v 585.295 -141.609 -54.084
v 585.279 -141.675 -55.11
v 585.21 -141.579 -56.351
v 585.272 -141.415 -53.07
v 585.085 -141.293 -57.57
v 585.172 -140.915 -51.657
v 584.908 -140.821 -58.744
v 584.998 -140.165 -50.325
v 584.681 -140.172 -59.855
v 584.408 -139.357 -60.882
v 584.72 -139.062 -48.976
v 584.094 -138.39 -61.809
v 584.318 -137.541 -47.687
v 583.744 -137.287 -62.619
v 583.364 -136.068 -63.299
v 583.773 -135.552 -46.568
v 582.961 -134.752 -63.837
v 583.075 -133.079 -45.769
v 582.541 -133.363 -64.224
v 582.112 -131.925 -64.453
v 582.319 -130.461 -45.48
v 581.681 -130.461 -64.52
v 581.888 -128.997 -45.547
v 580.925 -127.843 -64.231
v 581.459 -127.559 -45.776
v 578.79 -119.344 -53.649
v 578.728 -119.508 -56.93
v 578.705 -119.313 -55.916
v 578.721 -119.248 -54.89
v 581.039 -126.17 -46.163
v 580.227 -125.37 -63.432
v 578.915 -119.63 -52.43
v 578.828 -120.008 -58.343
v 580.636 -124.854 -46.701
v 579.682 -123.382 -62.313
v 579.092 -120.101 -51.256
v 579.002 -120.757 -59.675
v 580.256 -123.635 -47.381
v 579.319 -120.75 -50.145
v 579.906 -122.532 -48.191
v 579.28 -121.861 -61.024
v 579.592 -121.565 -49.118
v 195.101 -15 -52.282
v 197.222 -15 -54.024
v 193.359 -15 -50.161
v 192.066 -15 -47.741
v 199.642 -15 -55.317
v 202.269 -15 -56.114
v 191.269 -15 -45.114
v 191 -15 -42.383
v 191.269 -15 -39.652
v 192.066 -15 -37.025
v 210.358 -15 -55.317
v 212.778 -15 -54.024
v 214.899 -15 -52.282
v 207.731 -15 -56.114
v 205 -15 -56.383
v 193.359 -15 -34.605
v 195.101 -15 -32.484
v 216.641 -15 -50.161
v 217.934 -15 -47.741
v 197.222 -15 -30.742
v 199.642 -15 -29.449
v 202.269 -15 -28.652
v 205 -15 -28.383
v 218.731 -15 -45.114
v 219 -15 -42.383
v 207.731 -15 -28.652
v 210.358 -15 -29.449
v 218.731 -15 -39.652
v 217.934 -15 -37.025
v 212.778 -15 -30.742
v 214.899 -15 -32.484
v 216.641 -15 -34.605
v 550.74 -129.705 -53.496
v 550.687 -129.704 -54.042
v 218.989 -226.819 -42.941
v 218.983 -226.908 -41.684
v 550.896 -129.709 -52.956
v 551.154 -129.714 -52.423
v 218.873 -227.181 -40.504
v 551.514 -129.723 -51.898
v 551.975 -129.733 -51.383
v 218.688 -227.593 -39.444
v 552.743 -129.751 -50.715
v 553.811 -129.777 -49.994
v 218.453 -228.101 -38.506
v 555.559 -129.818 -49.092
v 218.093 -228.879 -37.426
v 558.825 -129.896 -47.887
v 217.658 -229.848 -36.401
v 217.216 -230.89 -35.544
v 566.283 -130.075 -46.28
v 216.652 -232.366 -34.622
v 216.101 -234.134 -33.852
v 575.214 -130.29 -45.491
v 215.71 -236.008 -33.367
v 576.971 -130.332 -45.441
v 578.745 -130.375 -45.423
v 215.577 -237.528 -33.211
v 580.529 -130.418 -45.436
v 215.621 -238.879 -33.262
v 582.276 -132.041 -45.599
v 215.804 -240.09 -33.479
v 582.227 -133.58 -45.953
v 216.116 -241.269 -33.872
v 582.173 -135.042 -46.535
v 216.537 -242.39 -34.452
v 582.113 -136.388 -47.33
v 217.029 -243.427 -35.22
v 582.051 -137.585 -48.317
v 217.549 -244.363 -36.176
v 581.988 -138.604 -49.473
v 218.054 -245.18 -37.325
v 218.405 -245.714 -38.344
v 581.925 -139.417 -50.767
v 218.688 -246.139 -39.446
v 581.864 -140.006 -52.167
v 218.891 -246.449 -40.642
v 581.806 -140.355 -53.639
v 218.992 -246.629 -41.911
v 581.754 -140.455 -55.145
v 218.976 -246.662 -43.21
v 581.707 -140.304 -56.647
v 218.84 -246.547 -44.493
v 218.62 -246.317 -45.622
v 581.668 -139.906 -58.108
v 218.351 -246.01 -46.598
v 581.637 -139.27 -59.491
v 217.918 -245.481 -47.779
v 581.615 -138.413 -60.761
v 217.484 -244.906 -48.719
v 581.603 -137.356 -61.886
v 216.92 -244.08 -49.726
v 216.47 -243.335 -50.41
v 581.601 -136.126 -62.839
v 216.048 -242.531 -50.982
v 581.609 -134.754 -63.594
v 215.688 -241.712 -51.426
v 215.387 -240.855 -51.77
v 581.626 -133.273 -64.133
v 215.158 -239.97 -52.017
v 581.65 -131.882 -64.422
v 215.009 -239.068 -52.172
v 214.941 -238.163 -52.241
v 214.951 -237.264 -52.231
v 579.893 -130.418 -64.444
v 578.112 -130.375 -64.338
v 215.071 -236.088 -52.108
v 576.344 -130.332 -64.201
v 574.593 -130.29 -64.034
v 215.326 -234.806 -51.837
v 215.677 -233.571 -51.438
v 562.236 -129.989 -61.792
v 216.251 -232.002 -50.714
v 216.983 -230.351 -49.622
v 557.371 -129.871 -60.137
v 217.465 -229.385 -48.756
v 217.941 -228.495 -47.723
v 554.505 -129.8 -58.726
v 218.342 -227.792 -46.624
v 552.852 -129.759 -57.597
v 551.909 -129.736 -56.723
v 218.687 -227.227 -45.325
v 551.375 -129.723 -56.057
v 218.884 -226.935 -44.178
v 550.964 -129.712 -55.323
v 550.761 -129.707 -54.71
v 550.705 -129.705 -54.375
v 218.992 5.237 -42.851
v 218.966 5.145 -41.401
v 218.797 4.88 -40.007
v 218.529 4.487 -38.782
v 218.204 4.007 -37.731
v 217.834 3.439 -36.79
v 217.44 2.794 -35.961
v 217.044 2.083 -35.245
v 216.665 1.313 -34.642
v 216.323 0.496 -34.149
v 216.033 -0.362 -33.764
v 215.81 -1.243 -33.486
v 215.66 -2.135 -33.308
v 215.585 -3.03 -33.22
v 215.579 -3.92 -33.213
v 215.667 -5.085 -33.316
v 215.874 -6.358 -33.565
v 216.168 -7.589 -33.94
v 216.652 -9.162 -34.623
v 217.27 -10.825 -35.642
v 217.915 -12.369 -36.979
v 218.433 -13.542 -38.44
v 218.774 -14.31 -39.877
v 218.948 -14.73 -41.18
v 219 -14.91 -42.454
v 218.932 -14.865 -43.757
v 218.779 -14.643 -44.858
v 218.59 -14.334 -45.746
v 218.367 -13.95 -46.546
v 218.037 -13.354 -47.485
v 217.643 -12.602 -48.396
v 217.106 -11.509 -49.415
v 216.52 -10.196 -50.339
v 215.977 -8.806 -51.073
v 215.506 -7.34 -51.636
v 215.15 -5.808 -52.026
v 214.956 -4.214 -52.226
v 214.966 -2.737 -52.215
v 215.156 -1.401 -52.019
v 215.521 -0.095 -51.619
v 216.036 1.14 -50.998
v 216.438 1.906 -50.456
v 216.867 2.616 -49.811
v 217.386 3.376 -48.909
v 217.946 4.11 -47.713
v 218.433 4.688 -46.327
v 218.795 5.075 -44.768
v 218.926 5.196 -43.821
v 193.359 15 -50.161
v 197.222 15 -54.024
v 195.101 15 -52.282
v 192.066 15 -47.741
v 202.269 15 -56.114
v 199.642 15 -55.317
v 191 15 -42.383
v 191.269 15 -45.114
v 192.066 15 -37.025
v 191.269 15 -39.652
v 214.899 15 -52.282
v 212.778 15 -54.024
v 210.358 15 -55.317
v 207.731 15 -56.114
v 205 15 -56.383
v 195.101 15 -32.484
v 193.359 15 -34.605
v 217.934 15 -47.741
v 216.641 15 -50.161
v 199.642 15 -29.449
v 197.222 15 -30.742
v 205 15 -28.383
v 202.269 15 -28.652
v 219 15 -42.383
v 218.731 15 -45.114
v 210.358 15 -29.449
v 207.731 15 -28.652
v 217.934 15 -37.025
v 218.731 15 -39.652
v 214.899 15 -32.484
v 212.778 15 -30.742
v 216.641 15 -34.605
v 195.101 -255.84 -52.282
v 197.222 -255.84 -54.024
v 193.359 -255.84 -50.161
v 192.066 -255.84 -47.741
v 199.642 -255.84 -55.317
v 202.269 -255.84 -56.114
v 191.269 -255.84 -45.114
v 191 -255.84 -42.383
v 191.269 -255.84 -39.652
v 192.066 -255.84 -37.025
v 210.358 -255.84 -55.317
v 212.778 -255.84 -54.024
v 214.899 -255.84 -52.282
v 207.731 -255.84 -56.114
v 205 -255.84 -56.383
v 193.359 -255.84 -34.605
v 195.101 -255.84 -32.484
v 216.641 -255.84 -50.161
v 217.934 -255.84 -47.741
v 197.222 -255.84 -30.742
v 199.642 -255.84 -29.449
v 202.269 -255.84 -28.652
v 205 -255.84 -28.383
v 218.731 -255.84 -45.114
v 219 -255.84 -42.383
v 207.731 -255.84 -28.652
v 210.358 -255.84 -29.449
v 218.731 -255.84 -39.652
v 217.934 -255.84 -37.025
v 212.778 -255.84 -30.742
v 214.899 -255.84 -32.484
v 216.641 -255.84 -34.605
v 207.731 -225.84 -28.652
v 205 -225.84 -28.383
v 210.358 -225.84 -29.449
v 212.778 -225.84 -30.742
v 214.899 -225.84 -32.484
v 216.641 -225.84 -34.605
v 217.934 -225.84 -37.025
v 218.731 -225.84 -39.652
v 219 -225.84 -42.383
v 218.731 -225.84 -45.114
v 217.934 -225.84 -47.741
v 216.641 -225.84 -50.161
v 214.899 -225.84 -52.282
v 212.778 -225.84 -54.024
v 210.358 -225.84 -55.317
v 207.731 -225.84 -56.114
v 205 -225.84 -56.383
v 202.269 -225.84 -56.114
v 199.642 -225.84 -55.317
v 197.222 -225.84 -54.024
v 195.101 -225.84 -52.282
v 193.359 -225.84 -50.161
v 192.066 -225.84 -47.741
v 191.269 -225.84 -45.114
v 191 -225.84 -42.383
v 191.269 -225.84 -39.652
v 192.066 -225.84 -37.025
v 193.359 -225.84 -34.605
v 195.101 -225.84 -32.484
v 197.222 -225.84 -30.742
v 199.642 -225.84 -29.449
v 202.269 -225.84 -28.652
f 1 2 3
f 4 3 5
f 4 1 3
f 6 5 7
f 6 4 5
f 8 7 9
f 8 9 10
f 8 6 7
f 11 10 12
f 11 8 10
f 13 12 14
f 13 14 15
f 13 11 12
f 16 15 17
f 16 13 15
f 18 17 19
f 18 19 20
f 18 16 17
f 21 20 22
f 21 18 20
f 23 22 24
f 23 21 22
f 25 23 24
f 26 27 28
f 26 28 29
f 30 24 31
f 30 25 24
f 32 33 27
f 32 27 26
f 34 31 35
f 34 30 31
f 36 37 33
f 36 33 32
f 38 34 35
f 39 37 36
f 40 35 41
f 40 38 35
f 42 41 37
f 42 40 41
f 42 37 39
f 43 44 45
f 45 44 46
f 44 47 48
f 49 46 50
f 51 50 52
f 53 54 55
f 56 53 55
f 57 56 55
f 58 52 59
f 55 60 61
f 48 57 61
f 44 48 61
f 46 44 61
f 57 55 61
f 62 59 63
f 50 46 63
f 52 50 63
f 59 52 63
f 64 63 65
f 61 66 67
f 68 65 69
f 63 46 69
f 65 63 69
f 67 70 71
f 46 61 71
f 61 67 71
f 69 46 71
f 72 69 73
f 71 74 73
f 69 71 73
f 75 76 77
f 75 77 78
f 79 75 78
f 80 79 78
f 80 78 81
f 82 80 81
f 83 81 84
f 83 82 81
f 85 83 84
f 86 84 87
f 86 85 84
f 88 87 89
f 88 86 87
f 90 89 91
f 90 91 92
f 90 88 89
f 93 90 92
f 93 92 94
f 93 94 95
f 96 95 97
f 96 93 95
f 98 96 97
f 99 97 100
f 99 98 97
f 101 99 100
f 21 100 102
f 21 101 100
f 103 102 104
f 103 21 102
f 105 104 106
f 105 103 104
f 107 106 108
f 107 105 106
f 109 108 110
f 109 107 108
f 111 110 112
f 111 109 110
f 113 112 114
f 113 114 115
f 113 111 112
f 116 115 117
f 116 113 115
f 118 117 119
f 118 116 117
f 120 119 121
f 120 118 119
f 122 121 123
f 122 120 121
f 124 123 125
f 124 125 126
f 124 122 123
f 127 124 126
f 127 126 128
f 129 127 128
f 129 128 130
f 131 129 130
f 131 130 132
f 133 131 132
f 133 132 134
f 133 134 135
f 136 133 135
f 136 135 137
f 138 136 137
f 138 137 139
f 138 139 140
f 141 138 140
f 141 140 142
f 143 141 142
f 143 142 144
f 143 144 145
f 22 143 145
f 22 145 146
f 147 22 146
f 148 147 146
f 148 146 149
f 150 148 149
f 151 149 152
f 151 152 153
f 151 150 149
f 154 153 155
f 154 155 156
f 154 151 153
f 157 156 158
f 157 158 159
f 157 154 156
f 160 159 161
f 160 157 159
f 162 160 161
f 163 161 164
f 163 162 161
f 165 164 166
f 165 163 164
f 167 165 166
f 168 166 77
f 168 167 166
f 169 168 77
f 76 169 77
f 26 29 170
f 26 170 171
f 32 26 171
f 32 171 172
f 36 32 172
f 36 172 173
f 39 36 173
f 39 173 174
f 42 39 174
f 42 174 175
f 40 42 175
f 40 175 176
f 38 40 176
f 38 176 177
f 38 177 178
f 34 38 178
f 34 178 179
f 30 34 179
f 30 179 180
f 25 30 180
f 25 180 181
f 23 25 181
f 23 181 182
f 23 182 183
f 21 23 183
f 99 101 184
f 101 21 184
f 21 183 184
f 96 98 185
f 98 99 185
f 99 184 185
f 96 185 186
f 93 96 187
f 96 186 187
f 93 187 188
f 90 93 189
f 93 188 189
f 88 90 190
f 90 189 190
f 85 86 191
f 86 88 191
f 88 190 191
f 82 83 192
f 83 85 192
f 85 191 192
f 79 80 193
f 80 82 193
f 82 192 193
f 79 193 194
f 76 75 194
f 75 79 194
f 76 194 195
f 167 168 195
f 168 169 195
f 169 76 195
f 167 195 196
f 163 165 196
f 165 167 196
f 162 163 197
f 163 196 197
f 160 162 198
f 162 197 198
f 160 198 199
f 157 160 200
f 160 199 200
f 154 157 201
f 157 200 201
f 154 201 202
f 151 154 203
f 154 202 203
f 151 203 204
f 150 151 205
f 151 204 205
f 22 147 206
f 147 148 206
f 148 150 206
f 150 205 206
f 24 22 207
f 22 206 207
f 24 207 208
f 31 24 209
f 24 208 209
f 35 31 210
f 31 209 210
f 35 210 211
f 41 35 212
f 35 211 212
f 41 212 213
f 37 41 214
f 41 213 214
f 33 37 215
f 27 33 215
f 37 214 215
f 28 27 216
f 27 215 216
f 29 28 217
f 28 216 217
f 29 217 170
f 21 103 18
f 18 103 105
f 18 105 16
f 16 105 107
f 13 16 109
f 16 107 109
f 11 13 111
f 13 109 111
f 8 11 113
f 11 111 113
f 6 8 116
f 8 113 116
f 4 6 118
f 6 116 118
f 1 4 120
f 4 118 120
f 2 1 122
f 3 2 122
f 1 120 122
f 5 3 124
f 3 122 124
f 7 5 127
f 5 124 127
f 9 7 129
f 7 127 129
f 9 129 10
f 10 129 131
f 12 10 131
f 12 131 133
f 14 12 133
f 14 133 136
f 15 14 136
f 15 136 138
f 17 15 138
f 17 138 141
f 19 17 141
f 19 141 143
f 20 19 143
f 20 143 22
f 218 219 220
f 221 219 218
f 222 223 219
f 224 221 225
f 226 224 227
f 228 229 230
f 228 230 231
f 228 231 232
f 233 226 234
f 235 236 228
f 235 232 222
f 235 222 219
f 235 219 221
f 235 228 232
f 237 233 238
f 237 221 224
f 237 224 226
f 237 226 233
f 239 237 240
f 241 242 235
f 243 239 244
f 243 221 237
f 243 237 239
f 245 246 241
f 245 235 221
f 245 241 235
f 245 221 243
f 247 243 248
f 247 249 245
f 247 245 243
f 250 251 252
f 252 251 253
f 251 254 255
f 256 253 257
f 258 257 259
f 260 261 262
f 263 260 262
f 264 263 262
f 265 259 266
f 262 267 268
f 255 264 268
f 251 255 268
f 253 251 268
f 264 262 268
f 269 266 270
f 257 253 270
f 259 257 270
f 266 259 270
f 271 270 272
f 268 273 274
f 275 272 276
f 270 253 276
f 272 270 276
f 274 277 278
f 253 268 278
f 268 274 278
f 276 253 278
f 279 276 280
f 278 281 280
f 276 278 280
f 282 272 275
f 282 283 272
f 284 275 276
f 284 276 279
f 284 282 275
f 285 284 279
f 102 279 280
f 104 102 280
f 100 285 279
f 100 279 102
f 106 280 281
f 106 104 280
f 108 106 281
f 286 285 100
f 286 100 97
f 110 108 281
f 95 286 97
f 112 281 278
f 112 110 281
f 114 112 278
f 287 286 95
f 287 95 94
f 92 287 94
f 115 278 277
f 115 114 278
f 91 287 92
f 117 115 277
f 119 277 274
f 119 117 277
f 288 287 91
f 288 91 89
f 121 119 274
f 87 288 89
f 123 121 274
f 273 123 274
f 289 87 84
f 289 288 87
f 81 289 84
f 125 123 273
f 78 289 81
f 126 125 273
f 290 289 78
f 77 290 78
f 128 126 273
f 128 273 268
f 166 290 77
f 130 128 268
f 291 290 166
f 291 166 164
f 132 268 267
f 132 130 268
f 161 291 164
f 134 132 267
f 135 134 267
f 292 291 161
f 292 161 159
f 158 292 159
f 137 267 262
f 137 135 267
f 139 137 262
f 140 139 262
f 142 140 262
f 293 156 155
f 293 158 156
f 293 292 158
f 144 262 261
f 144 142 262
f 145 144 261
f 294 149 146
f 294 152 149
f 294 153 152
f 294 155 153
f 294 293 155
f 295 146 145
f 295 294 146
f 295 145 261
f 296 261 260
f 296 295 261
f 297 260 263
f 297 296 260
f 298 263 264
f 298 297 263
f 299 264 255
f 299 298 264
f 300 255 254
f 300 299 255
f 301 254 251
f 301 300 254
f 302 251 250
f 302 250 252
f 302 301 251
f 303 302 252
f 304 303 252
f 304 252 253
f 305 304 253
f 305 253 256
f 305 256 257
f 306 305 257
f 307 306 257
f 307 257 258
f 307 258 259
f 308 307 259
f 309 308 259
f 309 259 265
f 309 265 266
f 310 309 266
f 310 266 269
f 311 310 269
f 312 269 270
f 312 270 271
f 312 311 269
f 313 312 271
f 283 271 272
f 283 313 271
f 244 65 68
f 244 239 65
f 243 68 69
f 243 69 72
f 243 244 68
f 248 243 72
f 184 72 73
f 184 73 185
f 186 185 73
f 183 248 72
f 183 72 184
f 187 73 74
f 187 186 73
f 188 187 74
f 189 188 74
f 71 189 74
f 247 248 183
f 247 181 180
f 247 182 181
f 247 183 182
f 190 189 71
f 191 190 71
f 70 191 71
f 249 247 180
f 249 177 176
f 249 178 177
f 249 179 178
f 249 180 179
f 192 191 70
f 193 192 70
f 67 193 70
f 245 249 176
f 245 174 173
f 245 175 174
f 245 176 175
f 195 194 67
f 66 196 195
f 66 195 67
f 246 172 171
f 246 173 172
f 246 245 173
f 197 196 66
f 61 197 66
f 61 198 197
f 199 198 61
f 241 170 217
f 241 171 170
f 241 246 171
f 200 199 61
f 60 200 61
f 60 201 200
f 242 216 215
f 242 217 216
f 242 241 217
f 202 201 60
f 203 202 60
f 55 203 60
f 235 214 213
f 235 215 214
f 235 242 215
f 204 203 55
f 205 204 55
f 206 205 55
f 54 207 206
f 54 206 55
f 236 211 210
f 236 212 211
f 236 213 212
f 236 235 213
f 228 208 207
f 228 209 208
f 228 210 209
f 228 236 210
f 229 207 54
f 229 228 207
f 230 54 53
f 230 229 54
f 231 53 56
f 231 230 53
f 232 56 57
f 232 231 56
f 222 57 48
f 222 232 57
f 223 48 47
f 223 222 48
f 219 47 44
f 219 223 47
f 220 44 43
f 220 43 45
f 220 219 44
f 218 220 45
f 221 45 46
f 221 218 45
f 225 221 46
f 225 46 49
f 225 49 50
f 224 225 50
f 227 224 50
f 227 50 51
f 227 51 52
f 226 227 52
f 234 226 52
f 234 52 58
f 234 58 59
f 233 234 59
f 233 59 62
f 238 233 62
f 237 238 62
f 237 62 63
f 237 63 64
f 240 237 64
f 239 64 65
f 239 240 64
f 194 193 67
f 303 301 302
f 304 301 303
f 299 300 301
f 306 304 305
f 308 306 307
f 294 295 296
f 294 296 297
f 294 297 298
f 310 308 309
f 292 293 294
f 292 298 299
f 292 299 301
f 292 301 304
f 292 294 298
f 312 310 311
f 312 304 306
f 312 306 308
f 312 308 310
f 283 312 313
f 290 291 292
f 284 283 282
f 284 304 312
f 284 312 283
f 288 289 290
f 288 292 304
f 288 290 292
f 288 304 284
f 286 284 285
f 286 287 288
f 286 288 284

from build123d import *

# Parameters (mm, degrees)
SUSP_FR_LCA_FRONT_LEG_PROFILE_R  = 9.525
SUSP_FR_LCA_REAR_LEG_START       = 194.971257269
SUSP_FR_LCA_REAR_LEG_OUTLINE_R   = 9.525
SUSP_FR_LCA_REAR_LEG_DEPTH       = 392.368202981
SUSP_FR_LCA_REAR_LEG_START_2     = 587.33946025
SUSP_FR_LCA_REAR_LEG_2_OUTLINE_R = 9.525
SUSP_FR_LCA_REAR_LEG_2_DEPTH     = 13.53250199
SUSP_FR_LCA_REAR_LEG_START_3     = 523.39106775
SUSP_FR_LCA_REAR_LEG_3_OUTLINE_W = 26
SUSP_FR_LCA_REAR_LEG_3_OUTLINE_H = 23
SUSP_FR_LCA_REAR_LEG_3_DEPTH     = 11.60893225
SUSP_FR_LCA_BUSH_FRONT_PROFILE_R = 14
SUSP_FR_LCA_BUSH_REAR_PROFILE_R  = 14


with BuildPart() as part:
    # SUSP_FR_LCA_front_leg: sweep along a curve in space
    with BuildLine() as susp_fr_lca_front_leg_path:
        Line((205, -240.84, -42.383), (582, -130.461196, -55))
    # SUSP_FR_LCA_front_leg profile (on start of the path) → SUSP_FR_LCA_front_leg (sweep)
    with BuildSketch(Plane(origin=(205, -240.84, -42.383), x_dir=(-0.2809863080066093, 0.9597117768959672, 0), z_dir=(0.9592171404331008, 0.28084148736685866, -0.03210196992266429))):
        Circle(SUSP_FR_LCA_FRONT_LEG_PROFILE_R)
    sweep(path=susp_fr_lca_front_leg_path.line)

    # SUSP_FR_LCA_rear_leg: read off the stored shape, not the designer's step
    # SUSP_FR_LCA_rear_leg outline → SUSP_FR_LCA_rear_leg (add)
    with BuildSketch(Plane(origin=(0, 0, 0), x_dir=(0.3266773785489796, 0.9450726759891053, -0.01093286070332221), z_dir=(0.9445438654680327, -0.3268602715210149, -0.031610901725756396)).offset(SUSP_FR_LCA_REAR_LEG_START)):
        with Locations((67.432230038, -35.502420765)):
            Circle(SUSP_FR_LCA_REAR_LEG_OUTLINE_R)
    extrude(amount=SUSP_FR_LCA_REAR_LEG_DEPTH)

    # SUSP_FR_LCA_rear_leg 2 outline → SUSP_FR_LCA_rear_leg 2 (add)
    with BuildSketch(Plane(origin=(0, 0, 0), x_dir=(0.3266773785489796, 0.9450726759891053, -0.01093286070332221), z_dir=(0.9445438654680327, -0.3268602715210149, -0.031610901725756396)).offset(SUSP_FR_LCA_REAR_LEG_START_2)):
        with Locations((67.432230038, -35.502420765)):
            Circle(SUSP_FR_LCA_REAR_LEG_2_OUTLINE_R)
    extrude(amount=SUSP_FR_LCA_REAR_LEG_2_DEPTH)

    # SUSP_FR_LCA_rear_leg 3 outline → SUSP_FR_LCA_rear_leg 3 (cut)
    with BuildSketch(Plane(origin=(0, 0, 0), x_dir=(-0.28068434396715386, 0.959754165905817, 0.009393619012821172), z_dir=(0.9592171404331008, 0.2808414873668589, -0.03210196992266429)).offset(SUSP_FR_LCA_REAR_LEG_START_3)):
        with Locations((-289, -35.5)):
            Rectangle(SUSP_FR_LCA_REAR_LEG_3_OUTLINE_W, SUSP_FR_LCA_REAR_LEG_3_OUTLINE_H)
    extrude(amount=SUSP_FR_LCA_REAR_LEG_3_DEPTH, mode=Mode.SUBTRACT)

    # SUSP_FR_LCA_bush_front: sweep along a curve in space
    with BuildLine() as susp_fr_lca_bush_front_path:
        Line((205, -255.84, -42.383), (205, -225.84, -42.383))
    # SUSP_FR_LCA_bush_front profile (on start of the path) → SUSP_FR_LCA_bush_front (sweep)
    with BuildSketch(Plane(origin=(205, -255.84, -42.383), x_dir=(0, 0, 1), z_dir=(0, 1, 0))):
        Circle(SUSP_FR_LCA_BUSH_FRONT_PROFILE_R)
    sweep(path=susp_fr_lca_bush_front_path.line)

    # SUSP_FR_LCA_bush_rear: sweep along a curve in space
    with BuildLine() as susp_fr_lca_bush_rear_path:
        Line((205, -15, -42.383), (205, 15, -42.383))
    # SUSP_FR_LCA_bush_rear profile (on start of the path) → SUSP_FR_LCA_bush_rear (sweep)
    with BuildSketch(Plane(origin=(205, -15, -42.383), x_dir=(0, 0, 1), z_dir=(0, 1, 0))):
        Circle(SUSP_FR_LCA_BUSH_REAR_PROFILE_R)
    sweep(path=susp_fr_lca_bush_rear_path.line)


solid = part.part
